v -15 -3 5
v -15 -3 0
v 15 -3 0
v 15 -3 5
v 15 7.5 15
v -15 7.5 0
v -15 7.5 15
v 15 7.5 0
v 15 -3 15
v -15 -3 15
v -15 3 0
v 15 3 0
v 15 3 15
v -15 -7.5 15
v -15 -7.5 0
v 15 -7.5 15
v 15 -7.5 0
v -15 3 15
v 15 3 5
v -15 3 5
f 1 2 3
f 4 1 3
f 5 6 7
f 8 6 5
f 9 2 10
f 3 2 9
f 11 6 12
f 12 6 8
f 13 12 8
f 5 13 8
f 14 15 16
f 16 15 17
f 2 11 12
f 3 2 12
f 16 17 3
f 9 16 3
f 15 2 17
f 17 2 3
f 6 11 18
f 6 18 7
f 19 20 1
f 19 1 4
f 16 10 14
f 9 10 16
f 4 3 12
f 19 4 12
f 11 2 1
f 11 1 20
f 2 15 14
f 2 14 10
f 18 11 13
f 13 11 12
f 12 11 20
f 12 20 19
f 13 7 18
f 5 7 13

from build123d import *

# Parameters (mm, degrees)
F0_W     = 30
F0_H     = 4.5
F1_DEPTH = 15
F0_H_2   = 6
F2_DEPTH = 5


with BuildPart() as f1:
    # F0 (on Top) → F1 (new body)
    with BuildSketch(Plane.XY):
        with Locations((0, 5.25)):
            Rectangle(F0_W, F0_H)
        with Locations((0, -5.25)):
            Rectangle(F0_W, F0_H)
    extrude(amount=F1_DEPTH)


with BuildPart() as f2:
    # F0 (on Top) → F2 (new body)
    with BuildSketch(Plane.XY):
        Rectangle(F0_W, F0_H_2)
    extrude(amount=F2_DEPTH)


solid = Compound([f1.part, f2.part])
